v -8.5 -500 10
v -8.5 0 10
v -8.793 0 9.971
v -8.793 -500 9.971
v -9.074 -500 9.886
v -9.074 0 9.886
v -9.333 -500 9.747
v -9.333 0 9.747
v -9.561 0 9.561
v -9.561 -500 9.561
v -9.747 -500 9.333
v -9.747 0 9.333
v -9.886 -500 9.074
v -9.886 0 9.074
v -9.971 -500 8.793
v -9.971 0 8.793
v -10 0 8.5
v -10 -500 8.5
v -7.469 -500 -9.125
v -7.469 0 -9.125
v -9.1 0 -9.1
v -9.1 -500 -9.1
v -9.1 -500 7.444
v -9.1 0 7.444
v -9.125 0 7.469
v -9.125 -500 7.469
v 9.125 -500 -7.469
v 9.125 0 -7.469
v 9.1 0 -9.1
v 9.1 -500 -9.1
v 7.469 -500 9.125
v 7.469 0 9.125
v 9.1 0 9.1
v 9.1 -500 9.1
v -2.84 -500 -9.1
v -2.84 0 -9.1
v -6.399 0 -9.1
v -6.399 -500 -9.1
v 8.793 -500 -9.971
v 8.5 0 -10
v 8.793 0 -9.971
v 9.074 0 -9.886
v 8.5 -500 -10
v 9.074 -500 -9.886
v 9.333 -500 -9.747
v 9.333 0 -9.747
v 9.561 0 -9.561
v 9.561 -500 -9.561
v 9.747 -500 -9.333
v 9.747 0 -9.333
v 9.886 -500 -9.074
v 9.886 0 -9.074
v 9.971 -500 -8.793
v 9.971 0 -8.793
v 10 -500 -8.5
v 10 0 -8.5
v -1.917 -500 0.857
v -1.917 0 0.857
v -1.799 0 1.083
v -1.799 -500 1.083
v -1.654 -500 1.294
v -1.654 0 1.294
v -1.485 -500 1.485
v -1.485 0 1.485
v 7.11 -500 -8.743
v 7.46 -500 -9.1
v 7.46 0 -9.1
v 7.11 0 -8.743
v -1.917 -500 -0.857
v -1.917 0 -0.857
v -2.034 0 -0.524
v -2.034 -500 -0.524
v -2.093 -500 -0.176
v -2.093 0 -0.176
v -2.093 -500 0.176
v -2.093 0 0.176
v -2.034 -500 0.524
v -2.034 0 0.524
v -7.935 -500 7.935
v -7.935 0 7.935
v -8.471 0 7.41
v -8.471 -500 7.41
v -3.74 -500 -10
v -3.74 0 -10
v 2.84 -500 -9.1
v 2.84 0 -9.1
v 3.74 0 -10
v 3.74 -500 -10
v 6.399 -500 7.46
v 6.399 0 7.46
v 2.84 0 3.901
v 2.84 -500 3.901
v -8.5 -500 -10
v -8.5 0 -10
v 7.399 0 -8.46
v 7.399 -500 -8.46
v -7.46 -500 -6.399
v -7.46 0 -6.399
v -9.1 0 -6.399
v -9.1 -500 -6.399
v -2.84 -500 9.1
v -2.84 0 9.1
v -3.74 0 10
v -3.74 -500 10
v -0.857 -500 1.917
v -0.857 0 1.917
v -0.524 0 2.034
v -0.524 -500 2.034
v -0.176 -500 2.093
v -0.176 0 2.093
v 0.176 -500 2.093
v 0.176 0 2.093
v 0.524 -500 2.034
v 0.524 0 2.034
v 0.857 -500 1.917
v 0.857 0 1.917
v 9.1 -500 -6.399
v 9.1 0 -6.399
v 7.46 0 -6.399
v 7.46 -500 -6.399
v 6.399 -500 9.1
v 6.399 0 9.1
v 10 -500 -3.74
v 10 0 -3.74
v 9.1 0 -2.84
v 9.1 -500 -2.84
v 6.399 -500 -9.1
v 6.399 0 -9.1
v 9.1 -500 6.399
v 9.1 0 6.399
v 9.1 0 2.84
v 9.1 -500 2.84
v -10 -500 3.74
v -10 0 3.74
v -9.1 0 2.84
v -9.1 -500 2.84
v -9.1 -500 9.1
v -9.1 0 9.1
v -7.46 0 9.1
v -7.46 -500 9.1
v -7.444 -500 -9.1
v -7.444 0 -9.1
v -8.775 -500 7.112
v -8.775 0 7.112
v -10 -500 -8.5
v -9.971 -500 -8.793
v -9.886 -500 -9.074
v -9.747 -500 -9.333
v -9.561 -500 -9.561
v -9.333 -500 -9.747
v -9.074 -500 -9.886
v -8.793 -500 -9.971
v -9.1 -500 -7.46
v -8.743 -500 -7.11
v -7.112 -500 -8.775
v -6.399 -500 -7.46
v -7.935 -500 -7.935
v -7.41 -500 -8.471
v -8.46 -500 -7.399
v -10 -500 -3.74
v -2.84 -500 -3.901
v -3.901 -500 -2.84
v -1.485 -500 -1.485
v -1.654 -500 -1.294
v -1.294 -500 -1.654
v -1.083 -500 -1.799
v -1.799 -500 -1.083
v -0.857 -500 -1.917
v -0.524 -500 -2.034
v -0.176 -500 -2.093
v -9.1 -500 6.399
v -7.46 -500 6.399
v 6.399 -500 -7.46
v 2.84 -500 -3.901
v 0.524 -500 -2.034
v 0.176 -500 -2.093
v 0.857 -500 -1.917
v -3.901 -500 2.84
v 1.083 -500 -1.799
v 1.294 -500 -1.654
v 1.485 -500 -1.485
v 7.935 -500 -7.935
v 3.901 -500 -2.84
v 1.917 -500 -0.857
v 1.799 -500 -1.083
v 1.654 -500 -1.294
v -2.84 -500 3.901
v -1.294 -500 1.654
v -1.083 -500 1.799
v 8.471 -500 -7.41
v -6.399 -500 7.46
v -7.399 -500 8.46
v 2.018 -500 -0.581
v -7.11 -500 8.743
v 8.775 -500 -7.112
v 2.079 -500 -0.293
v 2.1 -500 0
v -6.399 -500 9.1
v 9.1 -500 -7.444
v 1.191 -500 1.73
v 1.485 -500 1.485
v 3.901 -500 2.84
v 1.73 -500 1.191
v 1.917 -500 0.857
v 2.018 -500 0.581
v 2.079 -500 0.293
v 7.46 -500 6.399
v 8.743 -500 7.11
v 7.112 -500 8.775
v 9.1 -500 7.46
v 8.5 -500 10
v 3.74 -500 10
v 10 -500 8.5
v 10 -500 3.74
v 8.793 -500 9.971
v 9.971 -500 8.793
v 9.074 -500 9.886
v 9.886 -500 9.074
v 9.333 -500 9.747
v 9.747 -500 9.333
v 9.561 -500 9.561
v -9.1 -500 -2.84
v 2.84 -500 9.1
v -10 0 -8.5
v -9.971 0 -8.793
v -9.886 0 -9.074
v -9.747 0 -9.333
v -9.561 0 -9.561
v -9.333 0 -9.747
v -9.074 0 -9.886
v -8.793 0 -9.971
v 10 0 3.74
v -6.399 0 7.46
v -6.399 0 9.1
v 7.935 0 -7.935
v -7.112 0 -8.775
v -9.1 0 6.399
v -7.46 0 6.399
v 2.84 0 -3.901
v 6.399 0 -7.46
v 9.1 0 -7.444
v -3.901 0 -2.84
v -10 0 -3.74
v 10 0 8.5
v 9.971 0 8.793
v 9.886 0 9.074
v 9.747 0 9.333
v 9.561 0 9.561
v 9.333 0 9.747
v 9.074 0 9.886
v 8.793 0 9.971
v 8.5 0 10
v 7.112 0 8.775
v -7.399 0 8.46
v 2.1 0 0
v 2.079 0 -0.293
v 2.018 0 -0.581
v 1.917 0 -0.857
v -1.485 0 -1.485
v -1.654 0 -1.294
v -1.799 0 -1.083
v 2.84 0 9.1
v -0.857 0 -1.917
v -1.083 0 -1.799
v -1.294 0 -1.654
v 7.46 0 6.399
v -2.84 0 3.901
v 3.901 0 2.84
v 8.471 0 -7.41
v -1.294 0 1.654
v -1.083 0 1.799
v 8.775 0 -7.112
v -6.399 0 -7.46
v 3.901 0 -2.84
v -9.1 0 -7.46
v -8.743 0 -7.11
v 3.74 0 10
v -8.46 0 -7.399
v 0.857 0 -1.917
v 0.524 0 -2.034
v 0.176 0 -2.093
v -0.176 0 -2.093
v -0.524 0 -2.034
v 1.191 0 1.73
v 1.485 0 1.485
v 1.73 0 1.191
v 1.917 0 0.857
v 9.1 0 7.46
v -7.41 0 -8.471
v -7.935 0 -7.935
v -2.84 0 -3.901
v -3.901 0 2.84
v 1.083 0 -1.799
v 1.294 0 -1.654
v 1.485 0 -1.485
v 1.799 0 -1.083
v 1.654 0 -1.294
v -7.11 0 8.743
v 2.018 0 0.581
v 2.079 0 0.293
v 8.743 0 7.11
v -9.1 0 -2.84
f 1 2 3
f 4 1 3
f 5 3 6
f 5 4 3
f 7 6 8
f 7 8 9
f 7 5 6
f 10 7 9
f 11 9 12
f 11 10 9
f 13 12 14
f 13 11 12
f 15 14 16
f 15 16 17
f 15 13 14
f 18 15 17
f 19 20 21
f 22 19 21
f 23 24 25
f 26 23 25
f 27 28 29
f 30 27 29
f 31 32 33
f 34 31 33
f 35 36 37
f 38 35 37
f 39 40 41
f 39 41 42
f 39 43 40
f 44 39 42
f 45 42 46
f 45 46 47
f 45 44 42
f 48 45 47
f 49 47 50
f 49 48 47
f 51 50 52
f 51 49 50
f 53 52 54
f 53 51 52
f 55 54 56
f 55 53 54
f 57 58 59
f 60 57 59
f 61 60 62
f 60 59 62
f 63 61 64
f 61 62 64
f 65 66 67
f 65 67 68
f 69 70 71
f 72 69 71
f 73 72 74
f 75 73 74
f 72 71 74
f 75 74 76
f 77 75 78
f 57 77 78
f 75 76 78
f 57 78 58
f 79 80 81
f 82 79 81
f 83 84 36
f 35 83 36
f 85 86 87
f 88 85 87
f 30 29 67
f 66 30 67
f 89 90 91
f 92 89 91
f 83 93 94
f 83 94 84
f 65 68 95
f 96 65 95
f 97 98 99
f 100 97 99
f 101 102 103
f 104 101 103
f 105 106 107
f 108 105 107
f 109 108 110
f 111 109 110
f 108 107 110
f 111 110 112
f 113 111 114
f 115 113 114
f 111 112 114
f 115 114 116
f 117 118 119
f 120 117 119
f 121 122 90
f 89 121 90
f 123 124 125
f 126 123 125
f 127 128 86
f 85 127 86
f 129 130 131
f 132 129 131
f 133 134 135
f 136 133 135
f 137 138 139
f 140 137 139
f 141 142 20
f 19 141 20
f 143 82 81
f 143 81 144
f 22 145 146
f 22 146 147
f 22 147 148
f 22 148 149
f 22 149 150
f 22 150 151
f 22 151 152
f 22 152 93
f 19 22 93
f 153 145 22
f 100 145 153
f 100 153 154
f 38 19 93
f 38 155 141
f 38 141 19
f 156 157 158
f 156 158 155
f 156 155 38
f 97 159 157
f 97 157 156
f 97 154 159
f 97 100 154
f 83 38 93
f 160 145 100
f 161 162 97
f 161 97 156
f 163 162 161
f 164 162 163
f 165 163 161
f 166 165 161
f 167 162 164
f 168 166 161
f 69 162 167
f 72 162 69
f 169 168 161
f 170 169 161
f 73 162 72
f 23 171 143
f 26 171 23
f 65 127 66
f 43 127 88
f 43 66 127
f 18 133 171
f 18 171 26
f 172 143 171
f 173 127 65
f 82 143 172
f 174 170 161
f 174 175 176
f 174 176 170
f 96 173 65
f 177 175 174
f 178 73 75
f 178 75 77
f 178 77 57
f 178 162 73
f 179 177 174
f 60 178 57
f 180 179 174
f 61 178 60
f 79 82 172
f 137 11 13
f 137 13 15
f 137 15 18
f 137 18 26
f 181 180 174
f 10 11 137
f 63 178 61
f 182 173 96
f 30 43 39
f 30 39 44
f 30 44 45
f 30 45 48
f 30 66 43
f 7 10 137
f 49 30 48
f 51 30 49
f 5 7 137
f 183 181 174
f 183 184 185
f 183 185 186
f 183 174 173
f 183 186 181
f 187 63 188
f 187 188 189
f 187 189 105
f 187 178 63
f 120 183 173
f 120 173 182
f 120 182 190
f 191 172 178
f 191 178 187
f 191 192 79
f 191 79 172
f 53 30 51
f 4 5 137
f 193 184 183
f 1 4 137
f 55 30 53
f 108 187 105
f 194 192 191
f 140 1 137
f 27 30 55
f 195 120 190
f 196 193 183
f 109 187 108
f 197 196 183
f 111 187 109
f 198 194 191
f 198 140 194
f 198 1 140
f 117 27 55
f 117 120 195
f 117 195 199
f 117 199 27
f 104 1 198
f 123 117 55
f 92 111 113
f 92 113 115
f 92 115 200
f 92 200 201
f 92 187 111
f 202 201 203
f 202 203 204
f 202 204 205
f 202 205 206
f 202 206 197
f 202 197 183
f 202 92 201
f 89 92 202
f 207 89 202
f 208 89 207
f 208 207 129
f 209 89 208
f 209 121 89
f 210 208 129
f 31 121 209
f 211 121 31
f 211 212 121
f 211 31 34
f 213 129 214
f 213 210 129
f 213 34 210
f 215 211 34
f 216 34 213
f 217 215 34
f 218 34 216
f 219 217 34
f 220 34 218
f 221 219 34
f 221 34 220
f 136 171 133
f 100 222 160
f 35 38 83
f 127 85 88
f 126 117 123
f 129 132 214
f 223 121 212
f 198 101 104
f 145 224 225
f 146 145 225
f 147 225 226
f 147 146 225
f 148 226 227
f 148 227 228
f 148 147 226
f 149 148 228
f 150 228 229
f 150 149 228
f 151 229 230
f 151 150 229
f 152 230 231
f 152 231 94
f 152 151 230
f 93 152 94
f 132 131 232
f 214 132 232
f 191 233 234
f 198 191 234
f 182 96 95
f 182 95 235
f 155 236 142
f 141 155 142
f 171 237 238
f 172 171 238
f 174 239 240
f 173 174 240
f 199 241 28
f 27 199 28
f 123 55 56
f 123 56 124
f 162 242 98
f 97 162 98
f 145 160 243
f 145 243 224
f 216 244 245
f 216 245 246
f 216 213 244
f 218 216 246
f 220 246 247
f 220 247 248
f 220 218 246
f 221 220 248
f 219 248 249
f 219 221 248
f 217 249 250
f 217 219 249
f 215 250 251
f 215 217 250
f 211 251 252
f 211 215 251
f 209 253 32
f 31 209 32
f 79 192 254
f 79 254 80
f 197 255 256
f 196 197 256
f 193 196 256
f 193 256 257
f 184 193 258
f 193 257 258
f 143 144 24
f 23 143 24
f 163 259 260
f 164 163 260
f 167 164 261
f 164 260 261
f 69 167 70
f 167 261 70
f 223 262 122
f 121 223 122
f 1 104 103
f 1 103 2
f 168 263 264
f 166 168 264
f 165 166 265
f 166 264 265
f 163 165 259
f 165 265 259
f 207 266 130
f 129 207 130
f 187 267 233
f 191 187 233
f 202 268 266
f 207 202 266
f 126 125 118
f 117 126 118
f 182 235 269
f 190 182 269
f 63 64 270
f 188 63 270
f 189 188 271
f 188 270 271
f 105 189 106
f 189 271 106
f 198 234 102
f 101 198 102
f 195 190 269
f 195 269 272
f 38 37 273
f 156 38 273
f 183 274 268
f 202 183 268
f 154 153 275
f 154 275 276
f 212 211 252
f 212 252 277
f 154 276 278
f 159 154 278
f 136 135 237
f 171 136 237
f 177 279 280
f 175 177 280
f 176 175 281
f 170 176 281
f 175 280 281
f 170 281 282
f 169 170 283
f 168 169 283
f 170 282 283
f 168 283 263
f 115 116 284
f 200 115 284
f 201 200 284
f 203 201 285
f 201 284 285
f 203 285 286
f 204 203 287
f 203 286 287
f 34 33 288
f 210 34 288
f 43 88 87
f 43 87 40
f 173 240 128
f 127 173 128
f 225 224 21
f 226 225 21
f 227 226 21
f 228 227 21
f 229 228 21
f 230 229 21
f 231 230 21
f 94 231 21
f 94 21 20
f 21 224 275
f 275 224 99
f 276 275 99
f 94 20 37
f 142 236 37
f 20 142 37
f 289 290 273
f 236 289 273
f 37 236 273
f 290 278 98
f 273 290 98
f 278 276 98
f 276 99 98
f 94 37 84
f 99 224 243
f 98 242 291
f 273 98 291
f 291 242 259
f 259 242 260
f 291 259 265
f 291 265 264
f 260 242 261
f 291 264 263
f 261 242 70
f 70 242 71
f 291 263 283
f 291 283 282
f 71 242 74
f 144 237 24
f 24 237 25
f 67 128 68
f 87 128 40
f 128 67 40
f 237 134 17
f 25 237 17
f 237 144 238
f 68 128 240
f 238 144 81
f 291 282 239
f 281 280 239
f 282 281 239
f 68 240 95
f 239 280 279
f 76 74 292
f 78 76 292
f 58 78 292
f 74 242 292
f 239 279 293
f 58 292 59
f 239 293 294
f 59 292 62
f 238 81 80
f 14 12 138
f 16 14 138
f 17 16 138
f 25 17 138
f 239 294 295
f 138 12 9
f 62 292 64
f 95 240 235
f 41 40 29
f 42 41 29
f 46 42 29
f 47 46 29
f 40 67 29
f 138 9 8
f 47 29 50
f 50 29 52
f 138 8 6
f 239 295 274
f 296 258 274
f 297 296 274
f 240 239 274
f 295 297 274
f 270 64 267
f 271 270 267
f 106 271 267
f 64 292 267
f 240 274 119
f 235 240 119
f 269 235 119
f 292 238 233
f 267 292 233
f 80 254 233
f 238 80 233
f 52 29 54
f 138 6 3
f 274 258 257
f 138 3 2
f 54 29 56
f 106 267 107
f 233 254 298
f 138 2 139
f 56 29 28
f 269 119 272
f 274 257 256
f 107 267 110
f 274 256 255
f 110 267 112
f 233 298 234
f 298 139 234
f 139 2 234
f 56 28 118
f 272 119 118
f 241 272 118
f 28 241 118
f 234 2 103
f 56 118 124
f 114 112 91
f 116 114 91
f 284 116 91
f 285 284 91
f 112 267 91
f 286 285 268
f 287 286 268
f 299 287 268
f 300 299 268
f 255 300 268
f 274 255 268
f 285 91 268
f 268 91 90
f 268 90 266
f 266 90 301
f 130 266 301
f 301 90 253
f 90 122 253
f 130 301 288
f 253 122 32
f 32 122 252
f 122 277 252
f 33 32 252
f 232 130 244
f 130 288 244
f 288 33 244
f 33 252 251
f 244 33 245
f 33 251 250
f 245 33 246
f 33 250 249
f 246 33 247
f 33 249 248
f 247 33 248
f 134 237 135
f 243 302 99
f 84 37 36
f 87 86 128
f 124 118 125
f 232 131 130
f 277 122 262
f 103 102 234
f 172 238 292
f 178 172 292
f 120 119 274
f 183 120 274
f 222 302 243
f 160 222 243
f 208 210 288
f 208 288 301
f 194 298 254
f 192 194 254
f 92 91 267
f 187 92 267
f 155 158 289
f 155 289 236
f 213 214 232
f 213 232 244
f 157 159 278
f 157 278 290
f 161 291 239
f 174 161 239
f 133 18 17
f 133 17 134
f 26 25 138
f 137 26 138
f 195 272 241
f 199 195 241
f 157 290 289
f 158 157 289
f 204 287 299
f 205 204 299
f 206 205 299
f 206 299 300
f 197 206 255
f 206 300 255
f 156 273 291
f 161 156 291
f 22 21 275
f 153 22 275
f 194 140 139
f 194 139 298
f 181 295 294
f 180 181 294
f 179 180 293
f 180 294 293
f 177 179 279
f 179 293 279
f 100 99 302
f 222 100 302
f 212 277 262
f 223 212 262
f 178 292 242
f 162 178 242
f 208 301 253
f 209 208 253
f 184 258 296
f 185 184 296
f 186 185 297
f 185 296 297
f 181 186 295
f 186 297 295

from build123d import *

# Parameters (mm, degrees)
F1_DEPTH = 500
F2_R     = 1.5


with BuildPart() as f1:
    # F0 (on Front) → F1 (new body)
    with BuildSketch(Plane.XZ):
        Polygon((-7.46, 9.1), (-6.39934, 9.1), (-2.84, 9.1), (-3.74, 10), (-10, 10), (-10, 3.74), (-9.1, 2.84), (-9.1, 6.39934), (-9.1, 7.444134), (-9.124691, 7.46934), (-9.1, 9.1), align=None)
        Polygon((-7.399089, 8.459749), (-6.39934, 7.46), (-6.39934, 9.1), (-7.46, 9.1), (-7.110116, 8.742815), align=None)
        Polygon((-7.46, 6.39934), (-8.470702, 7.410042), (-8.774807, 7.112154), (-9.1, 7.444134), (-9.1, 6.39934), align=None)
        with BuildLine():
            ThreePointArc((-1.917323, 0.856663), (-1.729884, 1.190588), (-1.484924, 1.484924))
            Line((-1.484924, 1.484924), (-7.934896, 7.934896))
            Line((-7.934896, 7.934896), (-8.470702, 7.410042))
            Line((-8.470702, 7.410042), (-7.46, 6.39934))
            Line((-7.46, 6.39934), (-3.90066, 2.84))
            Line((-3.90066, 2.84), (-1.917323, 0.856663))
        make_face()
        with BuildLine():
            ThreePointArc((-1.484924, 1.484924), (-1.190588, 1.729884), (-0.856663, 1.917323))
            Line((-0.856663, 1.917323), (-2.84, 3.90066))
            Line((-2.84, 3.90066), (-6.39934, 7.46))
            Line((-6.39934, 7.46), (-7.399089, 8.459749))
            Line((-7.399089, 8.459749), (-7.934896, 7.934896))
            Line((-7.934896, 7.934896), (-1.484924, 1.484924))
        make_face()
        with BuildLine():
            ThreePointArc((0.856663, 1.917323), (1.484924, 1.484924), (1.917323, 0.856663))
            Line((1.917323, 0.856663), (3.90066, 2.84))
            Line((3.90066, 2.84), (7.46, 6.39934))
            Line((7.46, 6.39934), (9.1, 6.39934))
            Line((9.1, 6.39934), (9.1, 2.84))
            Line((9.1, 2.84), (10, 3.74))
            Line((10, 3.74), (10, 10))
            Line((10, 10), (3.74, 10))
            Line((3.74, 10), (2.84, 9.1))
            Line((2.84, 9.1), (6.39934, 9.1))
            Line((6.39934, 9.1), (6.39934, 7.46))
            Line((6.39934, 7.46), (2.84, 3.90066))
            Line((2.84, 3.90066), (0.856663, 1.917323))
        make_face()
        Polygon((7.112154, 8.774807), (7.46934, 9.124691), (9.1, 9.1), (9.1, 7.46), (8.742815, 7.110116), align=None, mode=Mode.SUBTRACT)
        with BuildLine():
            ThreePointArc((1.917323, 0.856663), (2.053823, 0.437962), (2.1, 0))
            ThreePointArc((2.1, 0), (2.053823, -0.437962), (1.917323, -0.856663))
            Line((1.917323, -0.856663), (3.90066, -2.84))
            Line((3.90066, -2.84), (3.90066, 2.84))
            Line((3.90066, 2.84), (1.917323, 0.856663))
        make_face()
        with BuildLine():
            ThreePointArc((-0.856663, 1.917323), (0, 2.1), (0.856663, 1.917323))
            Line((0.856663, 1.917323), (2.84, 3.90066))
            Line((2.84, 3.90066), (-2.84, 3.90066))
            Line((-2.84, 3.90066), (-0.856663, 1.917323))
        make_face()
        with BuildLine():
            ThreePointArc((-1.917323, -0.856663), (-2.1, 0), (-1.917323, 0.856663))
            Line((-1.917323, 0.856663), (-3.90066, 2.84))
            Line((-3.90066, 2.84), (-3.90066, -2.84))
            Line((-3.90066, -2.84), (-1.917323, -0.856663))
        make_face()
        with BuildLine():
            Line((2.84, -3.90066), (0.856663, -1.917323))
            ThreePointArc((0.856663, -1.917323), (0, -2.1), (-0.856663, -1.917323))
            Line((-0.856663, -1.917323), (-2.84, -3.90066))
            Line((-2.84, -3.90066), (2.84, -3.90066))
        make_face()
        with BuildLine():
            Line((-2.84, -3.90066), (-0.856663, -1.917323))
            ThreePointArc((-0.856663, -1.917323), (-1.190588, -1.729884), (-1.484924, -1.484924))
            Line((-1.484924, -1.484924), (-7.934896, -7.934896))
            Line((-7.934896, -7.934896), (-7.410042, -8.470702))
            Line((-7.410042, -8.470702), (-6.39934, -7.46))
            Line((-6.39934, -7.46), (-2.84, -3.90066))
        make_face()
        with BuildLine():
            Line((-7.934896, -7.934896), (-1.484924, -1.484924))
            ThreePointArc((-1.484924, -1.484924), (-1.729884, -1.190588), (-1.917323, -0.856663))
            Line((-1.917323, -0.856663), (-3.90066, -2.84))
            Line((-3.90066, -2.84), (-7.46, -6.39934))
            Line((-7.46, -6.39934), (-8.459749, -7.399089))
            Line((-8.459749, -7.399089), (-7.934896, -7.934896))
        make_face()
        with BuildLine():
            Line((7.934896, -7.934896), (1.484924, -1.484924))
            ThreePointArc((1.484924, -1.484924), (1.190588, -1.729884), (0.856663, -1.917323))
            Line((0.856663, -1.917323), (2.84, -3.90066))
            Line((2.84, -3.90066), (6.39934, -7.46))
            Line((6.39934, -7.46), (7.399089, -8.459749))
            Line((7.399089, -8.459749), (7.934896, -7.934896))
        make_face()
        with BuildLine():
            Line((3.90066, -2.84), (1.917323, -0.856663))
            ThreePointArc((1.917323, -0.856663), (1.729884, -1.190588), (1.484924, -1.484924))
            Line((1.484924, -1.484924), (7.934896, -7.934896))
            Line((7.934896, -7.934896), (8.470702, -7.410042))
            Line((8.470702, -7.410042), (7.46, -6.39934))
            Line((7.46, -6.39934), (3.90066, -2.84))
        make_face()
        Polygon((9.1, -2.84), (9.1, -6.39934), (9.1, -7.444134), (9.124691, -7.46934), (9.1, -9.1), (7.46, -9.1), (6.39934, -9.1), (2.84, -9.1), (3.74, -10), (10, -10), (10, -3.74), align=None)
        Polygon((9.1, -6.39934), (7.46, -6.39934), (8.470702, -7.410042), (8.774807, -7.112154), (9.1, -7.444134), align=None)
        Polygon((7.110116, -8.742815), (7.399089, -8.459749), (6.39934, -7.46), (6.39934, -9.1), (7.46, -9.1), align=None)
        Polygon((-2.84, -9.1), (-6.39934, -9.1), (-7.444134, -9.1), (-7.46934, -9.124691), (-9.1, -9.1), (-9.1, -7.46), (-9.1, -6.39934), (-9.1, -2.84), (-10, -3.74), (-10, -10), (-3.74, -10), align=None)
        Polygon((-6.39934, -9.1), (-6.39934, -7.46), (-7.410042, -8.470702), (-7.112154, -8.774807), (-7.444134, -9.1), align=None)
        Polygon((-8.742815, -7.110116), (-8.459749, -7.399089), (-7.46, -6.39934), (-9.1, -6.39934), (-9.1, -7.46), align=None)
    extrude(amount=F1_DEPTH)

    # F2
    f2_edges = [f1.edges().sort_by_distance(p)[0] for p in [
        (10, -250, 10),
        (-10, -250, 10),
        (-10, -250, -10),
        (10, -250, -10),
    ]]
    fillet(f2_edges, radius=F2_R)


solid = f1.part
